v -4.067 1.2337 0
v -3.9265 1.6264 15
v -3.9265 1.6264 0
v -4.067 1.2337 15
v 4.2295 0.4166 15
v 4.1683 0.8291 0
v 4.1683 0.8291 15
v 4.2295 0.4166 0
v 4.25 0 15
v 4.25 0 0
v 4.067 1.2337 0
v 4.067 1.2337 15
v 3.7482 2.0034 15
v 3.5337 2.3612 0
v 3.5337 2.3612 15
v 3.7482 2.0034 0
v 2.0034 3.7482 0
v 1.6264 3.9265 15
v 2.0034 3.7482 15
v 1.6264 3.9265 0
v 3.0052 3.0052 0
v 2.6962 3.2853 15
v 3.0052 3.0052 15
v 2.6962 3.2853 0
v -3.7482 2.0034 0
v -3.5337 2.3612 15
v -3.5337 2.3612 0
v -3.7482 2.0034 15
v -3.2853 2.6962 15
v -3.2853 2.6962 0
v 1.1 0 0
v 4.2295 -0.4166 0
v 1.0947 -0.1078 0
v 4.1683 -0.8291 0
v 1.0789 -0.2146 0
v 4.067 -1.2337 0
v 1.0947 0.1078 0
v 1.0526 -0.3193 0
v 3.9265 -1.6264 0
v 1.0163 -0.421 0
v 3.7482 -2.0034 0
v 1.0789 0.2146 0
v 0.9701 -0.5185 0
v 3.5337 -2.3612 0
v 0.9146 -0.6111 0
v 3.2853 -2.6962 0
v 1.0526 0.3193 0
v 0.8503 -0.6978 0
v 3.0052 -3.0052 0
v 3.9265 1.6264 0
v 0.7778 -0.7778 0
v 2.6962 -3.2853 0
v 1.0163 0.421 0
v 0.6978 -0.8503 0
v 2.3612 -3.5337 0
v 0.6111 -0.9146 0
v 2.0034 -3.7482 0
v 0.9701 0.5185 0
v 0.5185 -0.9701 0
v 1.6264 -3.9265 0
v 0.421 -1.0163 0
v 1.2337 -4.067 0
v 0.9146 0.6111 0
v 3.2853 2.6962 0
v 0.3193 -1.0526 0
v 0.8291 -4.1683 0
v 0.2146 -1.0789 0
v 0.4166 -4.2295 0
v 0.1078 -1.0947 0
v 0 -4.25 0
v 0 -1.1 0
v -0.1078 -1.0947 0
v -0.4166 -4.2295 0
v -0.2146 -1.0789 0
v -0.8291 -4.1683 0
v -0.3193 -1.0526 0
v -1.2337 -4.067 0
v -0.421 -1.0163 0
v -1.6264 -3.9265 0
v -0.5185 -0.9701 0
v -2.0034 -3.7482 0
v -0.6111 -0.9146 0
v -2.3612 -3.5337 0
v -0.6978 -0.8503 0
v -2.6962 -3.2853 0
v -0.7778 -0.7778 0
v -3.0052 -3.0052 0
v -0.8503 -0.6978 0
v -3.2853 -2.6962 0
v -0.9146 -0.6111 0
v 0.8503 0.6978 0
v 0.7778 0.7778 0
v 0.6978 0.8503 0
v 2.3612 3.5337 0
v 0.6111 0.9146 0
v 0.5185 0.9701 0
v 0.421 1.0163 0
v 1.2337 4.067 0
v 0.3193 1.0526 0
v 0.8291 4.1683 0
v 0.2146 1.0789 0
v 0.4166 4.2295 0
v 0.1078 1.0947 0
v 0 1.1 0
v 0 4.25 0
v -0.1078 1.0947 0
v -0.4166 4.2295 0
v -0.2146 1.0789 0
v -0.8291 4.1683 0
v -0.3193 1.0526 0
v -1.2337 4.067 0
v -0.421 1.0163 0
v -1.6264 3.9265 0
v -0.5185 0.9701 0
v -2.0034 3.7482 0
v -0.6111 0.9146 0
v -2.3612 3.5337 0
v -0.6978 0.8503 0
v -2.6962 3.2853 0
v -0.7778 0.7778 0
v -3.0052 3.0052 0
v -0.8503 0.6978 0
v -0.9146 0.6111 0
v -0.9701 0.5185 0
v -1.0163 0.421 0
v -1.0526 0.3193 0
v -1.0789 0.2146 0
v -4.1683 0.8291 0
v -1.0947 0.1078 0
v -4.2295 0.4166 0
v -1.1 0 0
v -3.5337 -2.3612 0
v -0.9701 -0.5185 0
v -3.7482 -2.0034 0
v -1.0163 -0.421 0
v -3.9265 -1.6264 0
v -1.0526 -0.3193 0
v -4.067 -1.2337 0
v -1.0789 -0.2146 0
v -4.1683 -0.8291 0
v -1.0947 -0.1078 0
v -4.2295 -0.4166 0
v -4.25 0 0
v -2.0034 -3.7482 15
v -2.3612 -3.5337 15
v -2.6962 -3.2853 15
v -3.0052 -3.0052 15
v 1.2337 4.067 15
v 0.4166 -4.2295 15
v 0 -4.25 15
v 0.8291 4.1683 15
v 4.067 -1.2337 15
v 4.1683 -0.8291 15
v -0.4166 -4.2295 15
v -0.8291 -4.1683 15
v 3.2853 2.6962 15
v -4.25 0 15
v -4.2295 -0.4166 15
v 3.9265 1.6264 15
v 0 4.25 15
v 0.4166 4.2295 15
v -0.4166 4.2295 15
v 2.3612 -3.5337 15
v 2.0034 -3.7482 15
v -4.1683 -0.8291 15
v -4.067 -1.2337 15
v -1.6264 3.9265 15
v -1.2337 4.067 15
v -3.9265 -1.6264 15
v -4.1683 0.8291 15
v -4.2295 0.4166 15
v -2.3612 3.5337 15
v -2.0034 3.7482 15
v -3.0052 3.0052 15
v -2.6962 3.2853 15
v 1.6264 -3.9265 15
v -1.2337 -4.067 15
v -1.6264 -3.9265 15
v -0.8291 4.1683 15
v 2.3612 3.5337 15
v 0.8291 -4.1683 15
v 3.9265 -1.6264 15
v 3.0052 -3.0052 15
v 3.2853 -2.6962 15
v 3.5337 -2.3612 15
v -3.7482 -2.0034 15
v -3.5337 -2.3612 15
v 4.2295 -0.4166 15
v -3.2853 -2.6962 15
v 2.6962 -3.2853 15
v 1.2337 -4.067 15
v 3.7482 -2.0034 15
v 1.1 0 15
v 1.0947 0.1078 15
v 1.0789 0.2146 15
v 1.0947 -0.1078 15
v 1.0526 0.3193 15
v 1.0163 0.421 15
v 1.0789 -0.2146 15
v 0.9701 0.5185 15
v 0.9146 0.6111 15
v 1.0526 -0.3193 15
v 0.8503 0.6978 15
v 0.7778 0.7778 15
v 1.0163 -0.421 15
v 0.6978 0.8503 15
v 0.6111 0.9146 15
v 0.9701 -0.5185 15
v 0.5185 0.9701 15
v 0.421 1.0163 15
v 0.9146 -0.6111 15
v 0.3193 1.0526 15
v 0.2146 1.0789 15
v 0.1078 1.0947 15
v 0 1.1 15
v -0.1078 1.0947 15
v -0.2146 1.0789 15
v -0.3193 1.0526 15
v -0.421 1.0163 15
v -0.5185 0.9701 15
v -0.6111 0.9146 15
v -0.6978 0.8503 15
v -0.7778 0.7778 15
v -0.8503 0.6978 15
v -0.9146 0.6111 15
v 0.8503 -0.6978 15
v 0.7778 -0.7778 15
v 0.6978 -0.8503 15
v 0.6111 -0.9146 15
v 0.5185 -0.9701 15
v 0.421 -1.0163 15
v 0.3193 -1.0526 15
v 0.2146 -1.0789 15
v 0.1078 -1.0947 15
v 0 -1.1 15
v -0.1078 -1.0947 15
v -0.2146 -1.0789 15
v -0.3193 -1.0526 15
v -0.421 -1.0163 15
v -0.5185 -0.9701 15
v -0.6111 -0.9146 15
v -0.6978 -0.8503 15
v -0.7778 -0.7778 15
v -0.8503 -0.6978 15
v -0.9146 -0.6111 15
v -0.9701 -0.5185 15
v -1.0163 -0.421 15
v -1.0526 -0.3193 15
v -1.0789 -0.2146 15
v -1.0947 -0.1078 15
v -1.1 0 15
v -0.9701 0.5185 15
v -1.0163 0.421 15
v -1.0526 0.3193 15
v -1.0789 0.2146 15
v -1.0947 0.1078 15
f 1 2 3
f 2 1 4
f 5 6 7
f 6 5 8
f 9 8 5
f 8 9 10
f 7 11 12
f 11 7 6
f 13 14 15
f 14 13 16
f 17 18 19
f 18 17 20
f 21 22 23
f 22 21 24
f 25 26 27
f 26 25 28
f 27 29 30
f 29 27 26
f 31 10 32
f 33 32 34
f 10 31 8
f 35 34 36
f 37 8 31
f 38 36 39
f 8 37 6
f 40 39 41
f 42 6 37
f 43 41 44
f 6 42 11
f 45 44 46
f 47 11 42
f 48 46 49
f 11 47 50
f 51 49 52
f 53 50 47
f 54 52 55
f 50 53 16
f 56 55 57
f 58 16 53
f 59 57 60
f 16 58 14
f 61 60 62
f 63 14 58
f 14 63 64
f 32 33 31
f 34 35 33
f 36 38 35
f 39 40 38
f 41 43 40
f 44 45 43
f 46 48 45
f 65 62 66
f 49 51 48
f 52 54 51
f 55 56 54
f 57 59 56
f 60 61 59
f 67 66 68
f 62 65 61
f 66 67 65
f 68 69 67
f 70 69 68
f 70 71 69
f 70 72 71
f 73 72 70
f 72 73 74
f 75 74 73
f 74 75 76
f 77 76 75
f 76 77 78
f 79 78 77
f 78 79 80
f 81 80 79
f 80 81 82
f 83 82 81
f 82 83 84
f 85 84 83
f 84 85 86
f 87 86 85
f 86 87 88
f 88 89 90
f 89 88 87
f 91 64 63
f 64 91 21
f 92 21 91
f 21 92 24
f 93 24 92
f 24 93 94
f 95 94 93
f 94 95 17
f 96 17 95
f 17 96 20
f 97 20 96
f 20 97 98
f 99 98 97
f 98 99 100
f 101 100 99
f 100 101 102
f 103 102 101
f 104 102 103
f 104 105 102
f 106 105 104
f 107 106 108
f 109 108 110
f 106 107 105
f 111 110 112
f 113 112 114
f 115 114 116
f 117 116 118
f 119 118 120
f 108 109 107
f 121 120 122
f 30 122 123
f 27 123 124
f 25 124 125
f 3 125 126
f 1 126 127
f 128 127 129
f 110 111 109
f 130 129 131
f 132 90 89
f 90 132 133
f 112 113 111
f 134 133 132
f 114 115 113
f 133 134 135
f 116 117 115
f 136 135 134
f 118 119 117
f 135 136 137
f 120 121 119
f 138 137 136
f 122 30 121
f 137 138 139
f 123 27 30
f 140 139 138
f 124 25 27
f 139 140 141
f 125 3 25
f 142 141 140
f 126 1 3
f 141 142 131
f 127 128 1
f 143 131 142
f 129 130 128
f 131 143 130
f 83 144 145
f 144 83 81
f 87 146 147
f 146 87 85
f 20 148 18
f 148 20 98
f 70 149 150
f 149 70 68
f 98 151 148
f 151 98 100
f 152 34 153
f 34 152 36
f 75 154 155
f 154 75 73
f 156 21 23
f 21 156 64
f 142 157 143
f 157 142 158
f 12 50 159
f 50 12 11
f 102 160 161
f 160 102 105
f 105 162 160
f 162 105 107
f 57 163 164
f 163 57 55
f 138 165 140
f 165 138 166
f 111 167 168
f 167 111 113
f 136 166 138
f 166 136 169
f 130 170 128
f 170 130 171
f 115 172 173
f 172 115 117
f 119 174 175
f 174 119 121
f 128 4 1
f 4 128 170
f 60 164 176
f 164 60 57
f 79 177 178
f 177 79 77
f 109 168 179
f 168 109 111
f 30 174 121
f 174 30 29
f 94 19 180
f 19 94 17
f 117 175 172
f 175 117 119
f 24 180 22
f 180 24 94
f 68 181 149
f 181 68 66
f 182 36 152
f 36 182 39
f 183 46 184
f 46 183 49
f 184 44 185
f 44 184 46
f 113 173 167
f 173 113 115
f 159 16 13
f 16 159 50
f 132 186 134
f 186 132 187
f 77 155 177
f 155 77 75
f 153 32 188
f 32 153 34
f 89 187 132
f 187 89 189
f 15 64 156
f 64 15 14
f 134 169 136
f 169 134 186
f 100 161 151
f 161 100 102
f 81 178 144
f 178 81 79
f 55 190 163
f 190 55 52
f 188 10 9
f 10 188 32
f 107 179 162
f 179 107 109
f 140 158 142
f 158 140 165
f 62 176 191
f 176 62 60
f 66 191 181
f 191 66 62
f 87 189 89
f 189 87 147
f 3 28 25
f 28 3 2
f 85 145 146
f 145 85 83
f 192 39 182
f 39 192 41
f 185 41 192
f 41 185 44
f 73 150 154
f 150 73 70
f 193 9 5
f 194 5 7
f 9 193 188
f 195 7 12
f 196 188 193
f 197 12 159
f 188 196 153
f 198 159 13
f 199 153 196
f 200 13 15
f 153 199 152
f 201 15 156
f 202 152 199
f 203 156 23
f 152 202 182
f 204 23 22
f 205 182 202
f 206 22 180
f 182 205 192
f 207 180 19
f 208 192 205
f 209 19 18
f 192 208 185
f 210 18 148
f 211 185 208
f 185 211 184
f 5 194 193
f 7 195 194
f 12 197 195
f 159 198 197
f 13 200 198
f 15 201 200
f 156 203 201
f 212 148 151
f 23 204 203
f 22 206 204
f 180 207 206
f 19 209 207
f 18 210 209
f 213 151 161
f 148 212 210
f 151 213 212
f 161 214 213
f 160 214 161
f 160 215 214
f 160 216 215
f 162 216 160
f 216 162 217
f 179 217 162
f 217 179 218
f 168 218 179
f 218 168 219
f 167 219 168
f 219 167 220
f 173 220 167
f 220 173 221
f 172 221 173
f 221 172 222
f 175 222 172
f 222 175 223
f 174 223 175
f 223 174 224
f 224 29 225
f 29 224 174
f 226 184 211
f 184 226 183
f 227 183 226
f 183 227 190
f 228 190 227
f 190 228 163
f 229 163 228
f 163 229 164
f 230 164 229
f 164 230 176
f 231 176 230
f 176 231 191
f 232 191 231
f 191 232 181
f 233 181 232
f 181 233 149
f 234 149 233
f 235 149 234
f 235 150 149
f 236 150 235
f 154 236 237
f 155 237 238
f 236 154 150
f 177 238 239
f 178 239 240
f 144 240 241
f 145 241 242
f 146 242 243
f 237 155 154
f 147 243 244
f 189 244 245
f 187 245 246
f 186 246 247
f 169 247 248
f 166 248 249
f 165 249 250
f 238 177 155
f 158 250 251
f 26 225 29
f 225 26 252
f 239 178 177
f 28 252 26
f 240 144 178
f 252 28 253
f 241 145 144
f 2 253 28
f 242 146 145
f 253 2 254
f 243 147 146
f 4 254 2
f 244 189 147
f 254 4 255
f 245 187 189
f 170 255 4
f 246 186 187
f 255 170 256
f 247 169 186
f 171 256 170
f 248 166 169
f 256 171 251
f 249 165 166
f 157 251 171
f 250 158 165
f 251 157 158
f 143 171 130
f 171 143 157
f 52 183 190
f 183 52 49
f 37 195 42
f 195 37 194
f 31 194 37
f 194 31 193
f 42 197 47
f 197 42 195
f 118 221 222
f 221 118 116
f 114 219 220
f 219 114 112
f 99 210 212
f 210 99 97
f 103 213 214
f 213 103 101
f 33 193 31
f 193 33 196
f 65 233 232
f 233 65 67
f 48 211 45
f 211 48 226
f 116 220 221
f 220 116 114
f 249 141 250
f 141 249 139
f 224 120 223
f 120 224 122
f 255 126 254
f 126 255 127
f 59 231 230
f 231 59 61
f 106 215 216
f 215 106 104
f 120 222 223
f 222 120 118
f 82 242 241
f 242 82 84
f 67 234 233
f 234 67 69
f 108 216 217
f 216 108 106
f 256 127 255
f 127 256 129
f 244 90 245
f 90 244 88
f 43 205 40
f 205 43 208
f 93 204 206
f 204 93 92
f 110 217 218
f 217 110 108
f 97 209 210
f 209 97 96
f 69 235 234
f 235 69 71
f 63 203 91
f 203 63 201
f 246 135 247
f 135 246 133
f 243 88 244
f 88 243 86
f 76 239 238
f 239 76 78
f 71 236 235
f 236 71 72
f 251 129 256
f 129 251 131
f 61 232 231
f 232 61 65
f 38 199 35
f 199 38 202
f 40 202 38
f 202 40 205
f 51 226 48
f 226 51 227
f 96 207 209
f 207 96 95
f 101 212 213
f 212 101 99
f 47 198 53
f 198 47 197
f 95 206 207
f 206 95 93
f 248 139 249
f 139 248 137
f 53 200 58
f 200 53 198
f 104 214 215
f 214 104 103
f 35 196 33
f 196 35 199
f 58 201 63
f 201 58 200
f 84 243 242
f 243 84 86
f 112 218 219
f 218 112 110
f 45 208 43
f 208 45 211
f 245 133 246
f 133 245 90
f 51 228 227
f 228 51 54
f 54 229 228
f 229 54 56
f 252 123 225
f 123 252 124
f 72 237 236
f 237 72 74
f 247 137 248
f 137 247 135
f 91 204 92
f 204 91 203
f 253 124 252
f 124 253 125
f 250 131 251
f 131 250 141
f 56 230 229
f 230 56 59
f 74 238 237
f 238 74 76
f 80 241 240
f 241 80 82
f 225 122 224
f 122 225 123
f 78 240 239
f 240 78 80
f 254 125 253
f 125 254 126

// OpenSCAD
difference(){
cylinder(h=15,d=8.5,$fn=64);
    translate([0,0,-2])
        cylinder(h=18,d=2.2,$fn=64);

}
